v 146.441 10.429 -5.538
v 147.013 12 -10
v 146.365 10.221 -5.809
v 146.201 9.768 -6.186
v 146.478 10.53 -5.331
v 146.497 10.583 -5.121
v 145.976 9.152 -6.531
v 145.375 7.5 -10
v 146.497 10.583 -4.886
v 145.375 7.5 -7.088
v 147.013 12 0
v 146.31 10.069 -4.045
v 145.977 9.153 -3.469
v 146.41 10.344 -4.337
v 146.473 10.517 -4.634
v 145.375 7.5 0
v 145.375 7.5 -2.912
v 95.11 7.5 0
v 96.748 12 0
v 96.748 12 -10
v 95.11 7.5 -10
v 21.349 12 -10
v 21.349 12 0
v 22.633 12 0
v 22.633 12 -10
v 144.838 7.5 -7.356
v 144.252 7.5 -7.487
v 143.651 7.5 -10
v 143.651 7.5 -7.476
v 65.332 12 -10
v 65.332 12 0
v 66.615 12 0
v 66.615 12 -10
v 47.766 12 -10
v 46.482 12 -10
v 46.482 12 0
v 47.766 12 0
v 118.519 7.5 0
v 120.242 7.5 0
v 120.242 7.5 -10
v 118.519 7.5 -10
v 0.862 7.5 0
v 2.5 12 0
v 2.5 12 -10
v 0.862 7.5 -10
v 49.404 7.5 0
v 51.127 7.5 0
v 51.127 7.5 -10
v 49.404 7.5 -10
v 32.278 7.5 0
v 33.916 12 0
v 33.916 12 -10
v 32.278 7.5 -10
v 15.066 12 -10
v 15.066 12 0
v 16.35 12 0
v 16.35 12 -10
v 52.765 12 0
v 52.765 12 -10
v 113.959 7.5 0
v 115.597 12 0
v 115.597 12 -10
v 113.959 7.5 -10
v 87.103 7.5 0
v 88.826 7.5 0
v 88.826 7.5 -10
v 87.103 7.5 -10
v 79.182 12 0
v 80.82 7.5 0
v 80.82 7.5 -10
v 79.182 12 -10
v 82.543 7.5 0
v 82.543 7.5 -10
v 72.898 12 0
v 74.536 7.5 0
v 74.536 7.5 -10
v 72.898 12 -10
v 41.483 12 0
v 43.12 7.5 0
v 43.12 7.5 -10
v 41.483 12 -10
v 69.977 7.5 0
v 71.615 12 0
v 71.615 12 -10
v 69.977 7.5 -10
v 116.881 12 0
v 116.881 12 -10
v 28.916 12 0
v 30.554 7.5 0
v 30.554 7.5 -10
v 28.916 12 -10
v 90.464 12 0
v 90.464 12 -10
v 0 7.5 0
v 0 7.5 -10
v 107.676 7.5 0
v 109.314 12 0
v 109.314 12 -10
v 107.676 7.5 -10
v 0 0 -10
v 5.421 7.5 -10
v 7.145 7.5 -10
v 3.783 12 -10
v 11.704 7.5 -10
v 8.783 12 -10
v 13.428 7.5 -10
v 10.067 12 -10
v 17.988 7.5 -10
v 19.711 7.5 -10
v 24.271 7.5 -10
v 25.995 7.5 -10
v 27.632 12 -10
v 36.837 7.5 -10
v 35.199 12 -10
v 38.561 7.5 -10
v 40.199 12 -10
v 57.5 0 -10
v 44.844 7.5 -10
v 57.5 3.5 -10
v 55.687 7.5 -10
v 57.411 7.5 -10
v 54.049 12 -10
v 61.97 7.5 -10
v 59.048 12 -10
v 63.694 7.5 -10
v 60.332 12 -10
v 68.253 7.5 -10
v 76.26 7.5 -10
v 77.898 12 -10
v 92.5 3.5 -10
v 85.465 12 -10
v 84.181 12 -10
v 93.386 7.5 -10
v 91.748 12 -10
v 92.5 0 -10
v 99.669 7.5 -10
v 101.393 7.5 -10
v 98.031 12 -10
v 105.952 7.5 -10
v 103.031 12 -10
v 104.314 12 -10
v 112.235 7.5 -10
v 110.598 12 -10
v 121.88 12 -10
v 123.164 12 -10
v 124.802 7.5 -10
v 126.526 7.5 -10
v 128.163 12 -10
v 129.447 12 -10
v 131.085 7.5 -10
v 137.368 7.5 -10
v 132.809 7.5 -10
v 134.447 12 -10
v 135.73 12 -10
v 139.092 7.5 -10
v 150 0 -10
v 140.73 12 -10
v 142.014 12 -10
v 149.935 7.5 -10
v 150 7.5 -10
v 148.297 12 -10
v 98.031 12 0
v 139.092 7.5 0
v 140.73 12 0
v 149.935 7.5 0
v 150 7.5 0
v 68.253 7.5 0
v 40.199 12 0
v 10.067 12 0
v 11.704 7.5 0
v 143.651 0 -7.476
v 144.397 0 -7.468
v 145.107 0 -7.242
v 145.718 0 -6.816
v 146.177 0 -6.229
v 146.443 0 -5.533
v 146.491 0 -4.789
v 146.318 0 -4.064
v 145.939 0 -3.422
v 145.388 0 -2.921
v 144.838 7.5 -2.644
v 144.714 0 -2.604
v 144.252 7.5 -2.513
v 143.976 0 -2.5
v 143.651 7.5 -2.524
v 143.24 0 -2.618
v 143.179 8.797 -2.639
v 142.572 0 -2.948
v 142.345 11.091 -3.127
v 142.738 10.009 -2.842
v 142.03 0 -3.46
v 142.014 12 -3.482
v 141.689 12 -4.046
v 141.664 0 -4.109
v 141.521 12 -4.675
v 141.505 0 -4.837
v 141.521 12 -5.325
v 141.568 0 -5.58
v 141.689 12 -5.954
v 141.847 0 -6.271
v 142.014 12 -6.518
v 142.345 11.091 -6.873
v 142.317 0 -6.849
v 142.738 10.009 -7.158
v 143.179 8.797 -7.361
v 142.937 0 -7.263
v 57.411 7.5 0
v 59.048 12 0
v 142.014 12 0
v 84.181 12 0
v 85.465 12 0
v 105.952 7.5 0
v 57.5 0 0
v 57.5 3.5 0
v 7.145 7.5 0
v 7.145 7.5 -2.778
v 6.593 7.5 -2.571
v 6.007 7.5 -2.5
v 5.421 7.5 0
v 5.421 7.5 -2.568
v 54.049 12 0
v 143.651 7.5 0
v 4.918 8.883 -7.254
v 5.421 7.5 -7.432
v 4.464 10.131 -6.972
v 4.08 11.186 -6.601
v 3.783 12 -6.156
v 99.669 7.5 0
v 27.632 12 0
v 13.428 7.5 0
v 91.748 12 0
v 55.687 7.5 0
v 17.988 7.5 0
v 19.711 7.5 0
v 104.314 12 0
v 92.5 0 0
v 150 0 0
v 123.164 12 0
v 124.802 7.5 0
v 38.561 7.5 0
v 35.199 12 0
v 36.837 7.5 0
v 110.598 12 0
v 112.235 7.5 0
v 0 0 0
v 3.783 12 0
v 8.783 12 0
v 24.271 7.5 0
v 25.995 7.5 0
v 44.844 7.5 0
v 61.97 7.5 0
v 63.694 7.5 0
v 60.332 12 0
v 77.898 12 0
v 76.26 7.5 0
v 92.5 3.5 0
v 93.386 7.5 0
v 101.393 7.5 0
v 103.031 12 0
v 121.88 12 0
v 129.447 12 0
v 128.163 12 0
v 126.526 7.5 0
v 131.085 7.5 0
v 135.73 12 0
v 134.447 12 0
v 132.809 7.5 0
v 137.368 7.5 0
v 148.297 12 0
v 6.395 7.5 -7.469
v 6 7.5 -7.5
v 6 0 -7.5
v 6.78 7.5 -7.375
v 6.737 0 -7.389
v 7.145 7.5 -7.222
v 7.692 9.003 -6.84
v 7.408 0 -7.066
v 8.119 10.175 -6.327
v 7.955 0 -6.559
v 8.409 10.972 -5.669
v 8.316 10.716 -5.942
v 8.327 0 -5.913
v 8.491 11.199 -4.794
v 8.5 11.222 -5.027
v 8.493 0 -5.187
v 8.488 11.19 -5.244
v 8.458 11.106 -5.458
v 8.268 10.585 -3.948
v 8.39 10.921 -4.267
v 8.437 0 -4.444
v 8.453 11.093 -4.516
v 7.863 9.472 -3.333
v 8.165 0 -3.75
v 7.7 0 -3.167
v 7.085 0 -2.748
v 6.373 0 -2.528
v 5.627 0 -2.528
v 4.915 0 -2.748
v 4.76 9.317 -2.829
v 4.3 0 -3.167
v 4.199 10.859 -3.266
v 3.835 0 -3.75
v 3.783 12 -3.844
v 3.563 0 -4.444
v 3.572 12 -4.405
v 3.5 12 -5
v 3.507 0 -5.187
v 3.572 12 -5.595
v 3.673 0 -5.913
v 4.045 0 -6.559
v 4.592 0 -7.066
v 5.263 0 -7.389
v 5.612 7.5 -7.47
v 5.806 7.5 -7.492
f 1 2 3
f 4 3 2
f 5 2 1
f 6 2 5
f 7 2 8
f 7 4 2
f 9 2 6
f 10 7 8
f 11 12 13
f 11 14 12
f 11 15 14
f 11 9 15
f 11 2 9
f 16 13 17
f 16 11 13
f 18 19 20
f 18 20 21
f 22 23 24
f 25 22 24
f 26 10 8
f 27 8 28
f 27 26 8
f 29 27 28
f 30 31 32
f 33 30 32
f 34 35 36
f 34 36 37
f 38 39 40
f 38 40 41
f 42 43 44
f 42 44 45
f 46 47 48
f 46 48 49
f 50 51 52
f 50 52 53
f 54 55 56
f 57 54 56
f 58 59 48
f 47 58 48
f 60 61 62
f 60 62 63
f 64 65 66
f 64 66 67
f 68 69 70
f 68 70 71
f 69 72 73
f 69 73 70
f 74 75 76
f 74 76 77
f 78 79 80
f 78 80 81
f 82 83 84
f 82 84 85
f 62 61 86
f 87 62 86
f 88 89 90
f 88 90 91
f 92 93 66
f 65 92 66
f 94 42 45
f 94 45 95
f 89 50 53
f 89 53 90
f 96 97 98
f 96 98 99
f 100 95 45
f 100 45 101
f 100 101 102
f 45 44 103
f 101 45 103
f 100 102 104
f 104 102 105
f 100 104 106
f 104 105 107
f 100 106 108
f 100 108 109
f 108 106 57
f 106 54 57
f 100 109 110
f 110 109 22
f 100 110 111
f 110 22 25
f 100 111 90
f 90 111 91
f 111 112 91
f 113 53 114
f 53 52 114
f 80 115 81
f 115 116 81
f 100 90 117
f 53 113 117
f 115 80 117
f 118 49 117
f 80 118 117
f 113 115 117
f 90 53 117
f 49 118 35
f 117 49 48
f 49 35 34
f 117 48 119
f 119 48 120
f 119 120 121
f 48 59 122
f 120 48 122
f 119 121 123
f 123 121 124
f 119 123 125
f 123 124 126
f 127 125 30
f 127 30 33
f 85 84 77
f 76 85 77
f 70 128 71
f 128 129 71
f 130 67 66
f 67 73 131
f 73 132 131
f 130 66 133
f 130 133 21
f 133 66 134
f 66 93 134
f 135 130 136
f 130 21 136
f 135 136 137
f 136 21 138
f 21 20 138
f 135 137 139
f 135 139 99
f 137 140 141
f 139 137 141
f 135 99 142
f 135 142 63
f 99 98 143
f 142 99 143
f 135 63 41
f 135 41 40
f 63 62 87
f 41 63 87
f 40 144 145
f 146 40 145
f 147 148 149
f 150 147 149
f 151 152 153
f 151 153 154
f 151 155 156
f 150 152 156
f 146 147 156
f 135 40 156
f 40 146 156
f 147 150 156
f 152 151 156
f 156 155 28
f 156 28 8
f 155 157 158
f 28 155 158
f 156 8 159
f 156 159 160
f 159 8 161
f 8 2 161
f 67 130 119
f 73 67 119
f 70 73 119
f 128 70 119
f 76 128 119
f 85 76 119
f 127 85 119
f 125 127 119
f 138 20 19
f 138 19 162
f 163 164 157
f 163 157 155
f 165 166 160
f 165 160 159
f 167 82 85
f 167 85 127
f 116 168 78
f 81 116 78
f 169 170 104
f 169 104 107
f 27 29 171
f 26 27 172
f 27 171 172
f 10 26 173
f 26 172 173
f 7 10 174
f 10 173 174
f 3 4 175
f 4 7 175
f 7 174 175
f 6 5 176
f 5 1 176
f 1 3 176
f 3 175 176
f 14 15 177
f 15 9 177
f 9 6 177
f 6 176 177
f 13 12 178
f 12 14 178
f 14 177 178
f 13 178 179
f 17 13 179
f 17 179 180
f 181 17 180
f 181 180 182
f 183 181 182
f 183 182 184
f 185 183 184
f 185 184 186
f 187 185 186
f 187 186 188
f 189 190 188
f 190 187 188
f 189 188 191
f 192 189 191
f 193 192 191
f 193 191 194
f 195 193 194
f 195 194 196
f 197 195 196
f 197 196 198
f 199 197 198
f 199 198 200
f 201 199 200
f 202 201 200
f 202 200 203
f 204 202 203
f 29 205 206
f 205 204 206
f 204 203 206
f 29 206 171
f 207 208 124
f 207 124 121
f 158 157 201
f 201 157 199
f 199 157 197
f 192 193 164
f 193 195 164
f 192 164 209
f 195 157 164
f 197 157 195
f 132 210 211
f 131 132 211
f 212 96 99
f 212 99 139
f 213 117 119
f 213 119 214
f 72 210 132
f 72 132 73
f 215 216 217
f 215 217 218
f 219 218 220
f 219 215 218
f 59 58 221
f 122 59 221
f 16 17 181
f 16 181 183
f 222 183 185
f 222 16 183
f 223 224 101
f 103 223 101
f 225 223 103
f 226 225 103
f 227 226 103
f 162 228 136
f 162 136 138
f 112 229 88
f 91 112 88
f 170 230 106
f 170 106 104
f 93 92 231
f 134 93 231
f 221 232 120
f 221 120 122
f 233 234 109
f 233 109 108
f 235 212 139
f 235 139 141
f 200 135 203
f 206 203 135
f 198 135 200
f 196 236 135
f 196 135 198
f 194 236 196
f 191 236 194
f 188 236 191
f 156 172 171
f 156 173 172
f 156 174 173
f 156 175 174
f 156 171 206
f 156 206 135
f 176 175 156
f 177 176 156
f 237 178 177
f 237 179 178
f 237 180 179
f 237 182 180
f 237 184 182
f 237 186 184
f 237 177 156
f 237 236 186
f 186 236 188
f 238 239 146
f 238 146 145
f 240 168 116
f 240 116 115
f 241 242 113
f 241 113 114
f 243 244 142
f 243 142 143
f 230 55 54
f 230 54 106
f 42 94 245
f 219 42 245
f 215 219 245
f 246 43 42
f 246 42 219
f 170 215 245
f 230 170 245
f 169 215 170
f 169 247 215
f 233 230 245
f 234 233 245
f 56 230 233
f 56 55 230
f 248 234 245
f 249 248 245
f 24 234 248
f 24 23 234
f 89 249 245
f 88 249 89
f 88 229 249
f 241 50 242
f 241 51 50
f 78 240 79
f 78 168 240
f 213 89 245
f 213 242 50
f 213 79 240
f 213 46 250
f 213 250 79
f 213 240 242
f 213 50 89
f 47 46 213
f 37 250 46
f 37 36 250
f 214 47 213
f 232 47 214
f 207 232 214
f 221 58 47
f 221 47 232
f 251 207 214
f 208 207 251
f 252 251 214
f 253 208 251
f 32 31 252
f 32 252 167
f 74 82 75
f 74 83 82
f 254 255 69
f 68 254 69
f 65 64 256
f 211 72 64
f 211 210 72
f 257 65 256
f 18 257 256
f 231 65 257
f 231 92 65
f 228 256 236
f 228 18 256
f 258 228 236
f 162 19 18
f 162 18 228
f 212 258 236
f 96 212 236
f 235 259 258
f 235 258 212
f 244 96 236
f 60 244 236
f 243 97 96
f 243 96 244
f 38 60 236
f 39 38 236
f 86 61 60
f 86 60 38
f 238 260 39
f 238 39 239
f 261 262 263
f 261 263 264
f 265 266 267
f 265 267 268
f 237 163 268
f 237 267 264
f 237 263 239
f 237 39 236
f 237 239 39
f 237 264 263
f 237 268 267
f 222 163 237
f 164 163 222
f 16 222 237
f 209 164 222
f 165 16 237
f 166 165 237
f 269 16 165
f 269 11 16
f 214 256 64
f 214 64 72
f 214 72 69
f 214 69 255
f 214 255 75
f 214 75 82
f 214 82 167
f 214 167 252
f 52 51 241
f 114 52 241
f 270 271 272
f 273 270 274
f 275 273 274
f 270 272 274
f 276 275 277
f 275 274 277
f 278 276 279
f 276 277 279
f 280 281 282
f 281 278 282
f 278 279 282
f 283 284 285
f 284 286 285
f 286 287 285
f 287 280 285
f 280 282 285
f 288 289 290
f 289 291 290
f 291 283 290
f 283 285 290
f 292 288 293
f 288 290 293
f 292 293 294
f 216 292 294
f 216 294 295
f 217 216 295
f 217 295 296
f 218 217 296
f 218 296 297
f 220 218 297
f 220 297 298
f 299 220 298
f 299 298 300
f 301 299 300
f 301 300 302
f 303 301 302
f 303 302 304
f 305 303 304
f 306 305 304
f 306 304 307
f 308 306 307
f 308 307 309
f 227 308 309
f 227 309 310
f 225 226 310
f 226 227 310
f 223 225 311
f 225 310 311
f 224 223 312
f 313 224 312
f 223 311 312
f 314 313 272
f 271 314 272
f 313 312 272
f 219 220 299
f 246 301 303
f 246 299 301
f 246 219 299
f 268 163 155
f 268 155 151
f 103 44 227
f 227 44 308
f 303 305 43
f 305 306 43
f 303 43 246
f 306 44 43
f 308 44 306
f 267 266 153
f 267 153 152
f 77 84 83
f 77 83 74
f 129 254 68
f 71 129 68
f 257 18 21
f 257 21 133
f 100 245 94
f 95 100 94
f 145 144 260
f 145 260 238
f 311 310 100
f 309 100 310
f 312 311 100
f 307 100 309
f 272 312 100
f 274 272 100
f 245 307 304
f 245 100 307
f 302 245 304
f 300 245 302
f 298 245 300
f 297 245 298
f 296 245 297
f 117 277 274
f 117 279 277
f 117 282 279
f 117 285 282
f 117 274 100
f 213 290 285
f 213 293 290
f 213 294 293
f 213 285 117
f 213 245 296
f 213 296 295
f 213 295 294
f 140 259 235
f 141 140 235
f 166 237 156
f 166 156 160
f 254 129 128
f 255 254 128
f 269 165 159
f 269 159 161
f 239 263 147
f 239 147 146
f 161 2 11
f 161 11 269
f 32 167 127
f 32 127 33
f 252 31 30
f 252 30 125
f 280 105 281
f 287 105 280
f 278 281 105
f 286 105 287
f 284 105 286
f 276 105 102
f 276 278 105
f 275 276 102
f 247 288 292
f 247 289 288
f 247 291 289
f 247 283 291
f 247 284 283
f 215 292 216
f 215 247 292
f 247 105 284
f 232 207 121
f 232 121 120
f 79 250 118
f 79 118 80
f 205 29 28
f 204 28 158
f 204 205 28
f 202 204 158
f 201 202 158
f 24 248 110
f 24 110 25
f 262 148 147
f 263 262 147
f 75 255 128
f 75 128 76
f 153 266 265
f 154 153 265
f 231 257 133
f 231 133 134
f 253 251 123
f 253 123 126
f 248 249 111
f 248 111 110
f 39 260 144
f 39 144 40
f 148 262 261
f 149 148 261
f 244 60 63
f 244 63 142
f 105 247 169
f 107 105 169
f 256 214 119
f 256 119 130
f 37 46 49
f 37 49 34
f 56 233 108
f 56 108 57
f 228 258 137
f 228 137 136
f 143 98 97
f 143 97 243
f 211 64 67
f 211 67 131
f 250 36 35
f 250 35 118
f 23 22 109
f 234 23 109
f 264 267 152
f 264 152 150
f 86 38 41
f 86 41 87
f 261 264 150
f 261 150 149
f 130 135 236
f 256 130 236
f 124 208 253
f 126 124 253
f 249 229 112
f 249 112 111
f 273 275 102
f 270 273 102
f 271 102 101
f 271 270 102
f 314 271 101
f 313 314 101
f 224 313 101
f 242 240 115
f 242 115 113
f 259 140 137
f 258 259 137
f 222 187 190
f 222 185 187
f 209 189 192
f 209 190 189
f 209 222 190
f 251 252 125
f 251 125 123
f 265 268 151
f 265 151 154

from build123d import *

# Parameters (mm, degrees)
BLANKSKE_W         = 150
BLANKSKE_H         = 12
BLANK_DEPTH        = 10
TOOTHCUTSIM_DEPTH  = 151.811140172
TEETHCUTS_COUNT    = 25
TEETHCUTS_PITCH    = 6.2831853
SKETCH1_W          = 35
SKETCH1_H          = 10
CUT_EXTRUDE1_DEPTH = 3.5
CUT_EXTRUDE2_REACH = 152.811
SKETCH2_R          = 2.5


with BuildPart() as part:
    # BlankSke → Blank (new body)
    with BuildSketch(Plane.XY):
        with Locations((75, 6)):
            Rectangle(BLANKSKE_W, BLANKSKE_H)
    extrude(amount=-BLANK_DEPTH)

    # TooCutSkeSim → ToothCutSim (cut, through all)
    with BuildSketch(Plane.XY):
        Polygon((0.861870739, 7.5), (-0.861870739, 7.5), (-2.508981637, 12.0254), (2.508981637, 12.0254), align=None)
    toothcutsim = extrude(amount=-TOOTHCUTSIM_DEPTH, mode=Mode.SUBTRACT)

    # TeethCuts: ToothCutSim ×25
    with Locations(*[(i * TEETHCUTS_PITCH, 0, 0) for i in range(1, TEETHCUTS_COUNT)]):
        add(toothcutsim, mode=Mode.SUBTRACT)

    # Sketch1 → Cut-Extrude1 (cut)
    with BuildSketch(Plane.XZ):
        with Locations((75, -5)):
            Rectangle(SKETCH1_W, SKETCH1_H)
    extrude(amount=-CUT_EXTRUDE1_DEPTH, mode=Mode.SUBTRACT)

    # Cut-Extrude2: up to this face of the body (flat: up to its plane)
    cut_extrude2_end = Plane(part.part.faces().sort_by_distance((141.37166925, 12, -5))[0])
    # Sketch2 → Cut-Extrude2 (cut, up to the picked face)
    with BuildSketch(Plane.XZ, mode=Mode.PRIVATE) as cut_extrude2_sk1:
        with Locations(Location((6, -5, 0), (0, 0, 270))):
            Circle(SKETCH2_R)
    cut_extrude2_tool1 = split(extrude(cut_extrude2_sk1.sketch, amount=-CUT_EXTRUDE2_REACH, mode=Mode.PRIVATE), bisect_by=cut_extrude2_end, keep=Keep.BOTH, mode=Mode.PRIVATE)
    # Sketch2 → Cut-Extrude2 (cut, up to the picked face)
    with BuildSketch(Plane.XZ, mode=Mode.PRIVATE) as cut_extrude2_sk2:
        with Locations(Location((144, -5, 0), (0, 0, 261.984352652))):
            Circle(SKETCH2_R)
    cut_extrude2_tool2 = split(extrude(cut_extrude2_sk2.sketch, amount=-CUT_EXTRUDE2_REACH, mode=Mode.PRIVATE), bisect_by=cut_extrude2_end, keep=Keep.BOTH, mode=Mode.PRIVATE)
    add(cut_extrude2_tool1.solids().sort_by(Axis((6, 0, -5), (0, 1, 0)))[0], mode=Mode.SUBTRACT)
    add(cut_extrude2_tool2.solids().sort_by(Axis((144, 0, -5), (0, 1, 0)))[0], mode=Mode.SUBTRACT)


solid = part.part
